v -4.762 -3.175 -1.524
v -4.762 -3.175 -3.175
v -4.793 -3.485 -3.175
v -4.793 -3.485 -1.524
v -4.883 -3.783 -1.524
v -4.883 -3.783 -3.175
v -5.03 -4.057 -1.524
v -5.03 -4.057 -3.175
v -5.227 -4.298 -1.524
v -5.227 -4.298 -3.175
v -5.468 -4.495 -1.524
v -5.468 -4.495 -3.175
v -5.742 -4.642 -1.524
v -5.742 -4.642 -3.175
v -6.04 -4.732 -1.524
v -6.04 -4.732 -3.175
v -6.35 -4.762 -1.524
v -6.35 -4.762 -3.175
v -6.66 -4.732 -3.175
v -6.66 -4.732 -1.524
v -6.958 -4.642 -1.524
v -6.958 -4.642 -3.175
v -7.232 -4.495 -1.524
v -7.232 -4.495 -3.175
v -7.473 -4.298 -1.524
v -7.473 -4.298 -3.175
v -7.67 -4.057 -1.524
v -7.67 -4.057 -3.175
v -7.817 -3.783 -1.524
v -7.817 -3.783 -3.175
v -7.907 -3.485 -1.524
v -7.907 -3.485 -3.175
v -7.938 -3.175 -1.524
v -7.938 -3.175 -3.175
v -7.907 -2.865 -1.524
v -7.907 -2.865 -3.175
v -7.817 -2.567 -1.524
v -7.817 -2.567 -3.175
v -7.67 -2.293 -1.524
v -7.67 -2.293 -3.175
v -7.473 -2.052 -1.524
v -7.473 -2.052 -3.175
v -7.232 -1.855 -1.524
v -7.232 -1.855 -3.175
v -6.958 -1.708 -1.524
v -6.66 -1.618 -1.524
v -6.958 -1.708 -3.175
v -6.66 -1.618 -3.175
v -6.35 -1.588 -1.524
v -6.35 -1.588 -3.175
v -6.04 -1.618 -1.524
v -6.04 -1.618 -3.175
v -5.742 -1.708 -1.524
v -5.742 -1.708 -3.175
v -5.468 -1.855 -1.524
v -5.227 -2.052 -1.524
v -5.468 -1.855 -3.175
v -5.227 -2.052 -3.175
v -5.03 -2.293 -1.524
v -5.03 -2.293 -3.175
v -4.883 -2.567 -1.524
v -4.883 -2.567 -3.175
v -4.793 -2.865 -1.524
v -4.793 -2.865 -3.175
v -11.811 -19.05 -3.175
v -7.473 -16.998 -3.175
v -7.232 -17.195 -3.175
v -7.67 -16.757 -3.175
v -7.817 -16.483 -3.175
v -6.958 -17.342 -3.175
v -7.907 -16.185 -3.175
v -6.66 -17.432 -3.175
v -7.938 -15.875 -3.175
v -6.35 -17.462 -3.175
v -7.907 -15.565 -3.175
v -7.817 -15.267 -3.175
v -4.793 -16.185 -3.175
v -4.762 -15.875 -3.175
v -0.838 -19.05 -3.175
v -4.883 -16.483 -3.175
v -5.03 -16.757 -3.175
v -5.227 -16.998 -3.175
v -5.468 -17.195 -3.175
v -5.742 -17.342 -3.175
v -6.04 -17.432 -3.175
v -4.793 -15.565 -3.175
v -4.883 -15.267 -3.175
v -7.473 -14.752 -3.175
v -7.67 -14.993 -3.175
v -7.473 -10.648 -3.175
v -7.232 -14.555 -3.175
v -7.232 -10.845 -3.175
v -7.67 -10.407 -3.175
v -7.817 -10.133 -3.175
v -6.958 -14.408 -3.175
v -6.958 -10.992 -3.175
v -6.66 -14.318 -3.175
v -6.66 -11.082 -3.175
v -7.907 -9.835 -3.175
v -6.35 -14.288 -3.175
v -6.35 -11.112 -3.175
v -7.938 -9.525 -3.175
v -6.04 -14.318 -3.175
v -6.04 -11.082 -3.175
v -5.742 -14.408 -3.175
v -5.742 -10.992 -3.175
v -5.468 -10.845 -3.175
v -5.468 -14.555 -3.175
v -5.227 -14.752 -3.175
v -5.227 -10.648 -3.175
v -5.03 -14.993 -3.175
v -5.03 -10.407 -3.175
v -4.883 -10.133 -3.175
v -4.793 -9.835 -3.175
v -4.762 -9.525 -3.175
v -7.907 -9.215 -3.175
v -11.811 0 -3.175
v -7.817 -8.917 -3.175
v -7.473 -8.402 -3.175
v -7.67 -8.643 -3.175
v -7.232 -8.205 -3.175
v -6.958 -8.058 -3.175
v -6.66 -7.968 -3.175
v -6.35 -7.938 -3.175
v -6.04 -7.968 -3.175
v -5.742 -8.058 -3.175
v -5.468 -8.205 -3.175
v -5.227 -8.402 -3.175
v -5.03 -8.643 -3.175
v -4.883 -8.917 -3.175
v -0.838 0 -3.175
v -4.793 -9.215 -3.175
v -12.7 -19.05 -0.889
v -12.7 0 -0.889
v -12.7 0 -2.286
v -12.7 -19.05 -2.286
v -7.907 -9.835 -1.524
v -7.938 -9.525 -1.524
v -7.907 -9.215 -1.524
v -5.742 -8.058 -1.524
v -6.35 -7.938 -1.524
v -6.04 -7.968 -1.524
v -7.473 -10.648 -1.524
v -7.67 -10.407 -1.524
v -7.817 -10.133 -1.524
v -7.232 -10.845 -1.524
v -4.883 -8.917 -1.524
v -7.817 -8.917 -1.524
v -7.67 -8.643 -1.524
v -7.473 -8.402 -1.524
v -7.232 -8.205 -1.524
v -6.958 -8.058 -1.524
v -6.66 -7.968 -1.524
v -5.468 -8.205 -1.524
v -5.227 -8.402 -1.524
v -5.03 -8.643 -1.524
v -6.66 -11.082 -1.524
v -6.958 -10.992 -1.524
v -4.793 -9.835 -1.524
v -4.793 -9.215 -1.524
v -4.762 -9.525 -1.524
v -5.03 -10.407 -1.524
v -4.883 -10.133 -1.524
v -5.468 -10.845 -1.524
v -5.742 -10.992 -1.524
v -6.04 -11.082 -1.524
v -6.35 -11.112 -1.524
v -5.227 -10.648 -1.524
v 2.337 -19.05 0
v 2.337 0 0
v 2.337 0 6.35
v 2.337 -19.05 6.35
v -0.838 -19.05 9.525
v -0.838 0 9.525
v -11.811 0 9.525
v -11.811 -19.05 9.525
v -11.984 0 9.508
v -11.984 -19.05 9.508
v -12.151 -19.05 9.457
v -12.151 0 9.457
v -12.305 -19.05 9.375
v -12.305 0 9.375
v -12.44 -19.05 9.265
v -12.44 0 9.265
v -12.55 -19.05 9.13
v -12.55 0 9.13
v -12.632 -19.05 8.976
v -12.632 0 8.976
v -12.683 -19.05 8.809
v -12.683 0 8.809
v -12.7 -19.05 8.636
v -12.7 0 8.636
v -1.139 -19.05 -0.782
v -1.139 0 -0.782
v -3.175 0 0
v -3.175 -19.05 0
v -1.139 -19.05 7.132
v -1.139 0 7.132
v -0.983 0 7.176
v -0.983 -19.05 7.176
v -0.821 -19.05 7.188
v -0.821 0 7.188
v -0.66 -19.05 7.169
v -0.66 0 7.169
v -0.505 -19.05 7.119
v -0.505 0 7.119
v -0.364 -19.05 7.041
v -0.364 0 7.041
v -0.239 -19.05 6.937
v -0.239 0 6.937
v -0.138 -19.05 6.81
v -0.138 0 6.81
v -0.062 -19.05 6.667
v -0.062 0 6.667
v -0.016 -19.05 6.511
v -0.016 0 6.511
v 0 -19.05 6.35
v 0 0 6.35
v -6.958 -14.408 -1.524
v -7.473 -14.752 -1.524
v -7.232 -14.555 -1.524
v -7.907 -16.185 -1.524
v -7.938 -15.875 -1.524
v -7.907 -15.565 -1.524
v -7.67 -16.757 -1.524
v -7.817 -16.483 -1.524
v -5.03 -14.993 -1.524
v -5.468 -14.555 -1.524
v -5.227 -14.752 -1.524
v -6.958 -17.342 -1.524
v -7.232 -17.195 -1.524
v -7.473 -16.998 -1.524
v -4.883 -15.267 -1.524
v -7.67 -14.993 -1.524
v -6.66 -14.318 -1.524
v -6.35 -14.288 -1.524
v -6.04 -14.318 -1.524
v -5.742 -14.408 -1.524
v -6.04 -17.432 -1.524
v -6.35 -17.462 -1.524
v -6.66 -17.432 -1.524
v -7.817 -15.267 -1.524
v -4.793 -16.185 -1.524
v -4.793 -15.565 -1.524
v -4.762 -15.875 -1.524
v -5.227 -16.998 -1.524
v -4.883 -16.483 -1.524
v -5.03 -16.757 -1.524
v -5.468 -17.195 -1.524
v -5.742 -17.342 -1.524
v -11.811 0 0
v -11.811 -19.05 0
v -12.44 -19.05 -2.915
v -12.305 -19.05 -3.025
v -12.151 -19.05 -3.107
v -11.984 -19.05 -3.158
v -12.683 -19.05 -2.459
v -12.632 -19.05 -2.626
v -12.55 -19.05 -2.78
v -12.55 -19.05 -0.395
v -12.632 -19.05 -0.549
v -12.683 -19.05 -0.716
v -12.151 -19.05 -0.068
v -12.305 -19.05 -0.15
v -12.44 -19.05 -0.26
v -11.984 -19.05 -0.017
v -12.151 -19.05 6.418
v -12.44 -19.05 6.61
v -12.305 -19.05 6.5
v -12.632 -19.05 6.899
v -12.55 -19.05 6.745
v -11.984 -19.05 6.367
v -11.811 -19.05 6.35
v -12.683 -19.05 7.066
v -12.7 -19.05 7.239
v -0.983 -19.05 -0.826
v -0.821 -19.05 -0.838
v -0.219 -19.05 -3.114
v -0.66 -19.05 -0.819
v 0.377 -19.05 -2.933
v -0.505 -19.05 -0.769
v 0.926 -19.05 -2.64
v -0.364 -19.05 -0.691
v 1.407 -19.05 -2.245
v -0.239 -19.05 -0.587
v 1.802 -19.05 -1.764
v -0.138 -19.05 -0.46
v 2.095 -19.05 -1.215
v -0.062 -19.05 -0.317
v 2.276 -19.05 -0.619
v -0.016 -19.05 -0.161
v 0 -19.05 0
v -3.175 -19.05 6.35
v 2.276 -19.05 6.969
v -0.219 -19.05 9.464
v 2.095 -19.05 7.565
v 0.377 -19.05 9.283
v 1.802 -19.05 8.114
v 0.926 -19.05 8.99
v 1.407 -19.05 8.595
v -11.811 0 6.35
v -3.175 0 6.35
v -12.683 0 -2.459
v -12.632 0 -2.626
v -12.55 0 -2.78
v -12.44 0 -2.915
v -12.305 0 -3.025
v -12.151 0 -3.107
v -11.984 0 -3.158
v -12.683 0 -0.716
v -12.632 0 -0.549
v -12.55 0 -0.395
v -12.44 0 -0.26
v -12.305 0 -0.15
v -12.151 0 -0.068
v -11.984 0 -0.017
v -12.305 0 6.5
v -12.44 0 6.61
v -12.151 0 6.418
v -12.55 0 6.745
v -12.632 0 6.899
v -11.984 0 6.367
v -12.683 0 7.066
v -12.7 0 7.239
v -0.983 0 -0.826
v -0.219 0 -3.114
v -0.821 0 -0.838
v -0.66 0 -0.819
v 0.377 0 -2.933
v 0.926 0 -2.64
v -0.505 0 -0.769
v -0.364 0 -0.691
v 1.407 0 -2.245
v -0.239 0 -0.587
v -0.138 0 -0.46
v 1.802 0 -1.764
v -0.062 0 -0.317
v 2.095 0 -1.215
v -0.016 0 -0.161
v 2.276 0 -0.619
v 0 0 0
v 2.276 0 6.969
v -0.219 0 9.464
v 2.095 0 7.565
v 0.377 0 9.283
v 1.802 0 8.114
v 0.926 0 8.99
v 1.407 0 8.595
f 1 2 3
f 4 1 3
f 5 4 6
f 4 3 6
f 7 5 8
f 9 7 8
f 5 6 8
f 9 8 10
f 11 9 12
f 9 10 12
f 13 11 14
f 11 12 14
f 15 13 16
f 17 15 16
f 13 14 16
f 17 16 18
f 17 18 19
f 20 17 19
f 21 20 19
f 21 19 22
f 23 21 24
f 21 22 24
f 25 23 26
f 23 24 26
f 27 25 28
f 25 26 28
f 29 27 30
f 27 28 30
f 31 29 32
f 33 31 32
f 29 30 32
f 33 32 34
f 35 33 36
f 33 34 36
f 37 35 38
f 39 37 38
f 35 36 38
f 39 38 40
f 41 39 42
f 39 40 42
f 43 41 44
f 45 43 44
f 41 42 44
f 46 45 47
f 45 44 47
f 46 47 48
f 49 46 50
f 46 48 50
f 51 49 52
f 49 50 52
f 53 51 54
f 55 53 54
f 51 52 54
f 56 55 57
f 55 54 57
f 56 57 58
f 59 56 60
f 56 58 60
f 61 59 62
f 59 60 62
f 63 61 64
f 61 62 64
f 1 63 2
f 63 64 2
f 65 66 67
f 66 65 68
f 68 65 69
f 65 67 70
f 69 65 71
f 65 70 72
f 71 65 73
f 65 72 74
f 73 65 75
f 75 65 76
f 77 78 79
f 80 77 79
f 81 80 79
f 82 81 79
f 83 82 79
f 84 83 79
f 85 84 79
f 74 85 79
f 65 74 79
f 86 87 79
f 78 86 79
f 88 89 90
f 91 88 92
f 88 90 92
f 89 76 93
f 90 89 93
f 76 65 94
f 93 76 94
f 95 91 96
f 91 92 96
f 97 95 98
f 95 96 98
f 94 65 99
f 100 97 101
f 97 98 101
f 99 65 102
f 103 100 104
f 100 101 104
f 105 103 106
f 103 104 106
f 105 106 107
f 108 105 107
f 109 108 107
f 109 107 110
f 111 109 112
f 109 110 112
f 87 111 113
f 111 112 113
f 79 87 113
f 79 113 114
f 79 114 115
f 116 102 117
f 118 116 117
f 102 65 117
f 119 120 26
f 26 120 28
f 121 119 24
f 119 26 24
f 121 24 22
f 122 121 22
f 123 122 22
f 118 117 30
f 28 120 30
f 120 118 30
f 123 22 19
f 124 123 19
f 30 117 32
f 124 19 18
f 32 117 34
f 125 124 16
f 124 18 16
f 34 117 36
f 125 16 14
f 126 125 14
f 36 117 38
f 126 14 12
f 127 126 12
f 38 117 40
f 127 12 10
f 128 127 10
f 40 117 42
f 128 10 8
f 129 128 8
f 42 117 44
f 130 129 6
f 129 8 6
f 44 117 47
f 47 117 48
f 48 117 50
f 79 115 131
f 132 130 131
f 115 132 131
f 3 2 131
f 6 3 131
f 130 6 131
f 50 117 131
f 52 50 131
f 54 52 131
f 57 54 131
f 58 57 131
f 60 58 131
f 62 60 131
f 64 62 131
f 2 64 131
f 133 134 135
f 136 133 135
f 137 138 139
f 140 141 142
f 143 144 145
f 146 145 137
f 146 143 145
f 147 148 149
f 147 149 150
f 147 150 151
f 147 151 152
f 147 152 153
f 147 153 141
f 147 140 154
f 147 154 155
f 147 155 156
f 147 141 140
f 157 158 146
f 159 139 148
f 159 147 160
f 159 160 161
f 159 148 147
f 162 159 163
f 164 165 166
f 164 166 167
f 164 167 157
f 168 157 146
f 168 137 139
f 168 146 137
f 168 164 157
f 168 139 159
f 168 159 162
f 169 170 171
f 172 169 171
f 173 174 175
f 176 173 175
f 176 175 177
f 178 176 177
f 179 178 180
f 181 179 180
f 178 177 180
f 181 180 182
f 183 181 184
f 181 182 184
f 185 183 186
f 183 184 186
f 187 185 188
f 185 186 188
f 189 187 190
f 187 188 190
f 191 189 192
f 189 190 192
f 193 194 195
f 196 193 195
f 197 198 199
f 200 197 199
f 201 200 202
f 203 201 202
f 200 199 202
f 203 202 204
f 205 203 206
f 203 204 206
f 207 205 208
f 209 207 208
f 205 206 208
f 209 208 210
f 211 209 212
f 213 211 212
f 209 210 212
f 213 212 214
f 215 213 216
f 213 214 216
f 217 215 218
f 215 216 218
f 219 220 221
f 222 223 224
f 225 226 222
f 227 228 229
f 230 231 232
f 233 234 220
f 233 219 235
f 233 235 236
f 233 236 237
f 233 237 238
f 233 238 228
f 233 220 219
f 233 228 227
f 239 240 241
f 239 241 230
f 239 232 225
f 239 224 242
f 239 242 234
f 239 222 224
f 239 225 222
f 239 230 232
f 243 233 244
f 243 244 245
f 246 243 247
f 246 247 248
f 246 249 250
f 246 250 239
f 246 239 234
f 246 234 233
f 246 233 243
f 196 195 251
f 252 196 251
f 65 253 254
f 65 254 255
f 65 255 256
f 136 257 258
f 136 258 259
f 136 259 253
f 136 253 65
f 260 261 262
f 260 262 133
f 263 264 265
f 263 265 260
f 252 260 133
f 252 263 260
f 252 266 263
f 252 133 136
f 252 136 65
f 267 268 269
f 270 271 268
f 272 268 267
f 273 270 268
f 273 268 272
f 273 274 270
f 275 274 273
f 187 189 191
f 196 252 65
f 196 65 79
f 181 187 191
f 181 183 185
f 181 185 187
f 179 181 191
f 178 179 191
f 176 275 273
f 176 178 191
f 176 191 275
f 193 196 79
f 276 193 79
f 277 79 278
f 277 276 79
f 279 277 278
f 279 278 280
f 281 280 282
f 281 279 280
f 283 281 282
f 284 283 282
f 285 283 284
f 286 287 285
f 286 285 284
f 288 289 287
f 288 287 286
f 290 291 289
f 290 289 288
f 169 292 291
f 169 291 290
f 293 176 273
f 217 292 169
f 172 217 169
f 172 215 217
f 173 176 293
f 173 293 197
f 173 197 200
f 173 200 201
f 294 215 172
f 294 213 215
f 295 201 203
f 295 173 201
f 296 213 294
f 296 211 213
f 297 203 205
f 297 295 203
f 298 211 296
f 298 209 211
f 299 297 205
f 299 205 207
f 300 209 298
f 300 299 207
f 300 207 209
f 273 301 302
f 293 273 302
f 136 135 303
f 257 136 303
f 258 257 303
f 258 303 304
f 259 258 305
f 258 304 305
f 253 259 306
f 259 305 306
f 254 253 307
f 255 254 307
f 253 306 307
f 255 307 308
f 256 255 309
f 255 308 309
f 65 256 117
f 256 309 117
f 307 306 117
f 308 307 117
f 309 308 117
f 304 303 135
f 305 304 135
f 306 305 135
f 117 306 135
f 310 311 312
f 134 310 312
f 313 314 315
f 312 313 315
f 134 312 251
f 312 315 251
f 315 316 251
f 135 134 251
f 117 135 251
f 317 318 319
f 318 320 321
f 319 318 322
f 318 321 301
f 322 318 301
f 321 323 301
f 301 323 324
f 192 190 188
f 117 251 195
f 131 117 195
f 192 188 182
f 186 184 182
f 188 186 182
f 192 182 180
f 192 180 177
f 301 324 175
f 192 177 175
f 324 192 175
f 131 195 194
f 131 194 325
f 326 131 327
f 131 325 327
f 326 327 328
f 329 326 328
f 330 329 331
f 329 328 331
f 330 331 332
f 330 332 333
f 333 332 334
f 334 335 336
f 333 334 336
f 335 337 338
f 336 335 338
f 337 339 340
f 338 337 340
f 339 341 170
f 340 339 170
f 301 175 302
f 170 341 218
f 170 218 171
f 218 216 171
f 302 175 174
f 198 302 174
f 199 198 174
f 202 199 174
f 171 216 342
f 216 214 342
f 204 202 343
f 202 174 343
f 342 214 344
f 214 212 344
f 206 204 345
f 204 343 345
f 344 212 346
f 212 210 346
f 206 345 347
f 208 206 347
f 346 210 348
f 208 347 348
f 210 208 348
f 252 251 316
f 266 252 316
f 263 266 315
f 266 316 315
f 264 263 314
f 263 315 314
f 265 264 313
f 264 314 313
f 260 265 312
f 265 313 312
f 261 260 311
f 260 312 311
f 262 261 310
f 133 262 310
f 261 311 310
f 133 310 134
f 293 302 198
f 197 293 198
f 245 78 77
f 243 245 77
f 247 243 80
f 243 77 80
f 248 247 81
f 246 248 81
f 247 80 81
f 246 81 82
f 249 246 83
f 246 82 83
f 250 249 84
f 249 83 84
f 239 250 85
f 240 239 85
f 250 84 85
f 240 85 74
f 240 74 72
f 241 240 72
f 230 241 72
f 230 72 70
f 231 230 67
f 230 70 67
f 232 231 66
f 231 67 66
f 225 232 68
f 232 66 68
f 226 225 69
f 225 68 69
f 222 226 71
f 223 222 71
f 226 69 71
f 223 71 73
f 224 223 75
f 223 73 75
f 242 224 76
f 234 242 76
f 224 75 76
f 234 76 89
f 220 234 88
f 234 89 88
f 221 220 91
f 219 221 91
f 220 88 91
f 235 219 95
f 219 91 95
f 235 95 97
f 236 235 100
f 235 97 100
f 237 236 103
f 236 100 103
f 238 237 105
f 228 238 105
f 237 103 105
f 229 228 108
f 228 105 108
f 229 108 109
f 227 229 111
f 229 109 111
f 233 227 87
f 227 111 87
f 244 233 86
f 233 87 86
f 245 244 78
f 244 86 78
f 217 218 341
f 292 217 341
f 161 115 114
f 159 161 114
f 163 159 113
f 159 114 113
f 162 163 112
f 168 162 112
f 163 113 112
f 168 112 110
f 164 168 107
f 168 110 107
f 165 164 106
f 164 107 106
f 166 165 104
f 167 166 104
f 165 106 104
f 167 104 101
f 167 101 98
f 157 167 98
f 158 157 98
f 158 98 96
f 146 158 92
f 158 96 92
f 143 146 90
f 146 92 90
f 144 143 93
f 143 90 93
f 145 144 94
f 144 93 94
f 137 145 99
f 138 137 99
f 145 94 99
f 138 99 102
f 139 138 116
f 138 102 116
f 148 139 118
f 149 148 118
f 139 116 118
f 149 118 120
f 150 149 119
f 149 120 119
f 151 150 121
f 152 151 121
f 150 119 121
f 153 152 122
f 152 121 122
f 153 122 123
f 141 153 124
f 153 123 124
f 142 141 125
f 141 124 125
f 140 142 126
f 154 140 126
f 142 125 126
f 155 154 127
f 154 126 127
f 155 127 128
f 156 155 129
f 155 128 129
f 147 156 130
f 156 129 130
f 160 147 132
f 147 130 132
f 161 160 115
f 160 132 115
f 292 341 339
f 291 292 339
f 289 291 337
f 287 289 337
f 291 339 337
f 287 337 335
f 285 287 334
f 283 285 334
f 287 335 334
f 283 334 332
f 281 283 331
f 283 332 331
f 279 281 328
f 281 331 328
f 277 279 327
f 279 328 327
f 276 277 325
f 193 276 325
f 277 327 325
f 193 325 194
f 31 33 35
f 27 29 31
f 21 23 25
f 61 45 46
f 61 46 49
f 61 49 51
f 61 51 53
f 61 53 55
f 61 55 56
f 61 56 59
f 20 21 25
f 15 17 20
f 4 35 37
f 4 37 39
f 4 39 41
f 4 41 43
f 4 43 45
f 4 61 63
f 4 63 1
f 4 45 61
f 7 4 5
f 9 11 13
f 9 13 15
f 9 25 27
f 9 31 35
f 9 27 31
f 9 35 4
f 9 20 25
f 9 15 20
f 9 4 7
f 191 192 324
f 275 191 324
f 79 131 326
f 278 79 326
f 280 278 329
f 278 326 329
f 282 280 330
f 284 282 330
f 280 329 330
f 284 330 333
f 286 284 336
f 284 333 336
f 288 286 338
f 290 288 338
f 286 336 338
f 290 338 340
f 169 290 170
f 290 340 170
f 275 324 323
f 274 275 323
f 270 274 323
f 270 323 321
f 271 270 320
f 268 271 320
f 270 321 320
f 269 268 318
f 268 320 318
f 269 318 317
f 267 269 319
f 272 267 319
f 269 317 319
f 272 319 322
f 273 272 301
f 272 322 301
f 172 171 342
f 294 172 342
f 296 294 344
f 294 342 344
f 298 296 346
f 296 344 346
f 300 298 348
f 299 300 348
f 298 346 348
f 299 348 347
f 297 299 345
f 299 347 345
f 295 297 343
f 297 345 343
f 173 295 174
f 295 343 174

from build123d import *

# Parameters (mm, degrees)
F1_DEPTH = 19.05
F2_R     = 1.5875
F3_DEPTH = 1.651


with BuildPart() as f1:
    # F0 (on Front) → F1 (new body)
    with BuildSketch(Plane.XZ):
        with BuildLine():
            Line((0, 6.35), (0, 0))
            ThreePointArc((0, 0), (-0.36356, -0.690866), (-1.138859, -0.782422))
            Line((-1.138859, -0.782422), (-3.175, 0))
            Line((-3.175, 0), (-11.811, 0))
            ThreePointArc((-11.811, 0), (-12.439618, -0.260382), (-12.7, -0.889))
            Line((-12.7, -0.889), (-12.7, -2.286))
            ThreePointArc((-12.7, -2.286), (-12.439618, -2.914618), (-11.811, -3.175))
            Line((-11.811, -3.175), (-0.8382, -3.175))
            ThreePointArc((-0.8382, -3.175), (1.406864, -2.245064), (2.3368, 0))
            Line((2.3368, 0), (2.3368, 6.35))
            ThreePointArc((2.3368, 6.35), (1.406864, 8.595064), (-0.8382, 9.525))
            Line((-0.8382, 9.525), (-11.811, 9.525))
            ThreePointArc((-11.811, 9.525), (-12.439618, 9.264618), (-12.7, 8.636))
            Line((-12.7, 8.636), (-12.7, 7.239))
            ThreePointArc((-12.7, 7.239), (-12.439618, 6.610382), (-11.811, 6.35))
            Line((-11.811, 6.35), (-3.175, 6.35))
            Line((-3.175, 6.35), (-1.138859, 7.132422))
            ThreePointArc((-1.138859, 7.132422), (-0.36356, 7.040866), (0, 6.35))
        make_face()
    extrude(amount=F1_DEPTH)

    # F2 (on face) → F3 (cut)
    with BuildSketch(Plane(origin=(0, 0, -3.175), x_dir=(1, 0, 0), z_dir=(0, 0, -1))):
        with Locations((-6.35, 15.875)):
            Circle(F2_R)
        with Locations((-6.35, 3.175)):
            Circle(F2_R)
        with Locations((-6.35, 9.525)):
            Circle(F2_R)
    extrude(amount=-F3_DEPTH, mode=Mode.SUBTRACT)


solid = f1.part
